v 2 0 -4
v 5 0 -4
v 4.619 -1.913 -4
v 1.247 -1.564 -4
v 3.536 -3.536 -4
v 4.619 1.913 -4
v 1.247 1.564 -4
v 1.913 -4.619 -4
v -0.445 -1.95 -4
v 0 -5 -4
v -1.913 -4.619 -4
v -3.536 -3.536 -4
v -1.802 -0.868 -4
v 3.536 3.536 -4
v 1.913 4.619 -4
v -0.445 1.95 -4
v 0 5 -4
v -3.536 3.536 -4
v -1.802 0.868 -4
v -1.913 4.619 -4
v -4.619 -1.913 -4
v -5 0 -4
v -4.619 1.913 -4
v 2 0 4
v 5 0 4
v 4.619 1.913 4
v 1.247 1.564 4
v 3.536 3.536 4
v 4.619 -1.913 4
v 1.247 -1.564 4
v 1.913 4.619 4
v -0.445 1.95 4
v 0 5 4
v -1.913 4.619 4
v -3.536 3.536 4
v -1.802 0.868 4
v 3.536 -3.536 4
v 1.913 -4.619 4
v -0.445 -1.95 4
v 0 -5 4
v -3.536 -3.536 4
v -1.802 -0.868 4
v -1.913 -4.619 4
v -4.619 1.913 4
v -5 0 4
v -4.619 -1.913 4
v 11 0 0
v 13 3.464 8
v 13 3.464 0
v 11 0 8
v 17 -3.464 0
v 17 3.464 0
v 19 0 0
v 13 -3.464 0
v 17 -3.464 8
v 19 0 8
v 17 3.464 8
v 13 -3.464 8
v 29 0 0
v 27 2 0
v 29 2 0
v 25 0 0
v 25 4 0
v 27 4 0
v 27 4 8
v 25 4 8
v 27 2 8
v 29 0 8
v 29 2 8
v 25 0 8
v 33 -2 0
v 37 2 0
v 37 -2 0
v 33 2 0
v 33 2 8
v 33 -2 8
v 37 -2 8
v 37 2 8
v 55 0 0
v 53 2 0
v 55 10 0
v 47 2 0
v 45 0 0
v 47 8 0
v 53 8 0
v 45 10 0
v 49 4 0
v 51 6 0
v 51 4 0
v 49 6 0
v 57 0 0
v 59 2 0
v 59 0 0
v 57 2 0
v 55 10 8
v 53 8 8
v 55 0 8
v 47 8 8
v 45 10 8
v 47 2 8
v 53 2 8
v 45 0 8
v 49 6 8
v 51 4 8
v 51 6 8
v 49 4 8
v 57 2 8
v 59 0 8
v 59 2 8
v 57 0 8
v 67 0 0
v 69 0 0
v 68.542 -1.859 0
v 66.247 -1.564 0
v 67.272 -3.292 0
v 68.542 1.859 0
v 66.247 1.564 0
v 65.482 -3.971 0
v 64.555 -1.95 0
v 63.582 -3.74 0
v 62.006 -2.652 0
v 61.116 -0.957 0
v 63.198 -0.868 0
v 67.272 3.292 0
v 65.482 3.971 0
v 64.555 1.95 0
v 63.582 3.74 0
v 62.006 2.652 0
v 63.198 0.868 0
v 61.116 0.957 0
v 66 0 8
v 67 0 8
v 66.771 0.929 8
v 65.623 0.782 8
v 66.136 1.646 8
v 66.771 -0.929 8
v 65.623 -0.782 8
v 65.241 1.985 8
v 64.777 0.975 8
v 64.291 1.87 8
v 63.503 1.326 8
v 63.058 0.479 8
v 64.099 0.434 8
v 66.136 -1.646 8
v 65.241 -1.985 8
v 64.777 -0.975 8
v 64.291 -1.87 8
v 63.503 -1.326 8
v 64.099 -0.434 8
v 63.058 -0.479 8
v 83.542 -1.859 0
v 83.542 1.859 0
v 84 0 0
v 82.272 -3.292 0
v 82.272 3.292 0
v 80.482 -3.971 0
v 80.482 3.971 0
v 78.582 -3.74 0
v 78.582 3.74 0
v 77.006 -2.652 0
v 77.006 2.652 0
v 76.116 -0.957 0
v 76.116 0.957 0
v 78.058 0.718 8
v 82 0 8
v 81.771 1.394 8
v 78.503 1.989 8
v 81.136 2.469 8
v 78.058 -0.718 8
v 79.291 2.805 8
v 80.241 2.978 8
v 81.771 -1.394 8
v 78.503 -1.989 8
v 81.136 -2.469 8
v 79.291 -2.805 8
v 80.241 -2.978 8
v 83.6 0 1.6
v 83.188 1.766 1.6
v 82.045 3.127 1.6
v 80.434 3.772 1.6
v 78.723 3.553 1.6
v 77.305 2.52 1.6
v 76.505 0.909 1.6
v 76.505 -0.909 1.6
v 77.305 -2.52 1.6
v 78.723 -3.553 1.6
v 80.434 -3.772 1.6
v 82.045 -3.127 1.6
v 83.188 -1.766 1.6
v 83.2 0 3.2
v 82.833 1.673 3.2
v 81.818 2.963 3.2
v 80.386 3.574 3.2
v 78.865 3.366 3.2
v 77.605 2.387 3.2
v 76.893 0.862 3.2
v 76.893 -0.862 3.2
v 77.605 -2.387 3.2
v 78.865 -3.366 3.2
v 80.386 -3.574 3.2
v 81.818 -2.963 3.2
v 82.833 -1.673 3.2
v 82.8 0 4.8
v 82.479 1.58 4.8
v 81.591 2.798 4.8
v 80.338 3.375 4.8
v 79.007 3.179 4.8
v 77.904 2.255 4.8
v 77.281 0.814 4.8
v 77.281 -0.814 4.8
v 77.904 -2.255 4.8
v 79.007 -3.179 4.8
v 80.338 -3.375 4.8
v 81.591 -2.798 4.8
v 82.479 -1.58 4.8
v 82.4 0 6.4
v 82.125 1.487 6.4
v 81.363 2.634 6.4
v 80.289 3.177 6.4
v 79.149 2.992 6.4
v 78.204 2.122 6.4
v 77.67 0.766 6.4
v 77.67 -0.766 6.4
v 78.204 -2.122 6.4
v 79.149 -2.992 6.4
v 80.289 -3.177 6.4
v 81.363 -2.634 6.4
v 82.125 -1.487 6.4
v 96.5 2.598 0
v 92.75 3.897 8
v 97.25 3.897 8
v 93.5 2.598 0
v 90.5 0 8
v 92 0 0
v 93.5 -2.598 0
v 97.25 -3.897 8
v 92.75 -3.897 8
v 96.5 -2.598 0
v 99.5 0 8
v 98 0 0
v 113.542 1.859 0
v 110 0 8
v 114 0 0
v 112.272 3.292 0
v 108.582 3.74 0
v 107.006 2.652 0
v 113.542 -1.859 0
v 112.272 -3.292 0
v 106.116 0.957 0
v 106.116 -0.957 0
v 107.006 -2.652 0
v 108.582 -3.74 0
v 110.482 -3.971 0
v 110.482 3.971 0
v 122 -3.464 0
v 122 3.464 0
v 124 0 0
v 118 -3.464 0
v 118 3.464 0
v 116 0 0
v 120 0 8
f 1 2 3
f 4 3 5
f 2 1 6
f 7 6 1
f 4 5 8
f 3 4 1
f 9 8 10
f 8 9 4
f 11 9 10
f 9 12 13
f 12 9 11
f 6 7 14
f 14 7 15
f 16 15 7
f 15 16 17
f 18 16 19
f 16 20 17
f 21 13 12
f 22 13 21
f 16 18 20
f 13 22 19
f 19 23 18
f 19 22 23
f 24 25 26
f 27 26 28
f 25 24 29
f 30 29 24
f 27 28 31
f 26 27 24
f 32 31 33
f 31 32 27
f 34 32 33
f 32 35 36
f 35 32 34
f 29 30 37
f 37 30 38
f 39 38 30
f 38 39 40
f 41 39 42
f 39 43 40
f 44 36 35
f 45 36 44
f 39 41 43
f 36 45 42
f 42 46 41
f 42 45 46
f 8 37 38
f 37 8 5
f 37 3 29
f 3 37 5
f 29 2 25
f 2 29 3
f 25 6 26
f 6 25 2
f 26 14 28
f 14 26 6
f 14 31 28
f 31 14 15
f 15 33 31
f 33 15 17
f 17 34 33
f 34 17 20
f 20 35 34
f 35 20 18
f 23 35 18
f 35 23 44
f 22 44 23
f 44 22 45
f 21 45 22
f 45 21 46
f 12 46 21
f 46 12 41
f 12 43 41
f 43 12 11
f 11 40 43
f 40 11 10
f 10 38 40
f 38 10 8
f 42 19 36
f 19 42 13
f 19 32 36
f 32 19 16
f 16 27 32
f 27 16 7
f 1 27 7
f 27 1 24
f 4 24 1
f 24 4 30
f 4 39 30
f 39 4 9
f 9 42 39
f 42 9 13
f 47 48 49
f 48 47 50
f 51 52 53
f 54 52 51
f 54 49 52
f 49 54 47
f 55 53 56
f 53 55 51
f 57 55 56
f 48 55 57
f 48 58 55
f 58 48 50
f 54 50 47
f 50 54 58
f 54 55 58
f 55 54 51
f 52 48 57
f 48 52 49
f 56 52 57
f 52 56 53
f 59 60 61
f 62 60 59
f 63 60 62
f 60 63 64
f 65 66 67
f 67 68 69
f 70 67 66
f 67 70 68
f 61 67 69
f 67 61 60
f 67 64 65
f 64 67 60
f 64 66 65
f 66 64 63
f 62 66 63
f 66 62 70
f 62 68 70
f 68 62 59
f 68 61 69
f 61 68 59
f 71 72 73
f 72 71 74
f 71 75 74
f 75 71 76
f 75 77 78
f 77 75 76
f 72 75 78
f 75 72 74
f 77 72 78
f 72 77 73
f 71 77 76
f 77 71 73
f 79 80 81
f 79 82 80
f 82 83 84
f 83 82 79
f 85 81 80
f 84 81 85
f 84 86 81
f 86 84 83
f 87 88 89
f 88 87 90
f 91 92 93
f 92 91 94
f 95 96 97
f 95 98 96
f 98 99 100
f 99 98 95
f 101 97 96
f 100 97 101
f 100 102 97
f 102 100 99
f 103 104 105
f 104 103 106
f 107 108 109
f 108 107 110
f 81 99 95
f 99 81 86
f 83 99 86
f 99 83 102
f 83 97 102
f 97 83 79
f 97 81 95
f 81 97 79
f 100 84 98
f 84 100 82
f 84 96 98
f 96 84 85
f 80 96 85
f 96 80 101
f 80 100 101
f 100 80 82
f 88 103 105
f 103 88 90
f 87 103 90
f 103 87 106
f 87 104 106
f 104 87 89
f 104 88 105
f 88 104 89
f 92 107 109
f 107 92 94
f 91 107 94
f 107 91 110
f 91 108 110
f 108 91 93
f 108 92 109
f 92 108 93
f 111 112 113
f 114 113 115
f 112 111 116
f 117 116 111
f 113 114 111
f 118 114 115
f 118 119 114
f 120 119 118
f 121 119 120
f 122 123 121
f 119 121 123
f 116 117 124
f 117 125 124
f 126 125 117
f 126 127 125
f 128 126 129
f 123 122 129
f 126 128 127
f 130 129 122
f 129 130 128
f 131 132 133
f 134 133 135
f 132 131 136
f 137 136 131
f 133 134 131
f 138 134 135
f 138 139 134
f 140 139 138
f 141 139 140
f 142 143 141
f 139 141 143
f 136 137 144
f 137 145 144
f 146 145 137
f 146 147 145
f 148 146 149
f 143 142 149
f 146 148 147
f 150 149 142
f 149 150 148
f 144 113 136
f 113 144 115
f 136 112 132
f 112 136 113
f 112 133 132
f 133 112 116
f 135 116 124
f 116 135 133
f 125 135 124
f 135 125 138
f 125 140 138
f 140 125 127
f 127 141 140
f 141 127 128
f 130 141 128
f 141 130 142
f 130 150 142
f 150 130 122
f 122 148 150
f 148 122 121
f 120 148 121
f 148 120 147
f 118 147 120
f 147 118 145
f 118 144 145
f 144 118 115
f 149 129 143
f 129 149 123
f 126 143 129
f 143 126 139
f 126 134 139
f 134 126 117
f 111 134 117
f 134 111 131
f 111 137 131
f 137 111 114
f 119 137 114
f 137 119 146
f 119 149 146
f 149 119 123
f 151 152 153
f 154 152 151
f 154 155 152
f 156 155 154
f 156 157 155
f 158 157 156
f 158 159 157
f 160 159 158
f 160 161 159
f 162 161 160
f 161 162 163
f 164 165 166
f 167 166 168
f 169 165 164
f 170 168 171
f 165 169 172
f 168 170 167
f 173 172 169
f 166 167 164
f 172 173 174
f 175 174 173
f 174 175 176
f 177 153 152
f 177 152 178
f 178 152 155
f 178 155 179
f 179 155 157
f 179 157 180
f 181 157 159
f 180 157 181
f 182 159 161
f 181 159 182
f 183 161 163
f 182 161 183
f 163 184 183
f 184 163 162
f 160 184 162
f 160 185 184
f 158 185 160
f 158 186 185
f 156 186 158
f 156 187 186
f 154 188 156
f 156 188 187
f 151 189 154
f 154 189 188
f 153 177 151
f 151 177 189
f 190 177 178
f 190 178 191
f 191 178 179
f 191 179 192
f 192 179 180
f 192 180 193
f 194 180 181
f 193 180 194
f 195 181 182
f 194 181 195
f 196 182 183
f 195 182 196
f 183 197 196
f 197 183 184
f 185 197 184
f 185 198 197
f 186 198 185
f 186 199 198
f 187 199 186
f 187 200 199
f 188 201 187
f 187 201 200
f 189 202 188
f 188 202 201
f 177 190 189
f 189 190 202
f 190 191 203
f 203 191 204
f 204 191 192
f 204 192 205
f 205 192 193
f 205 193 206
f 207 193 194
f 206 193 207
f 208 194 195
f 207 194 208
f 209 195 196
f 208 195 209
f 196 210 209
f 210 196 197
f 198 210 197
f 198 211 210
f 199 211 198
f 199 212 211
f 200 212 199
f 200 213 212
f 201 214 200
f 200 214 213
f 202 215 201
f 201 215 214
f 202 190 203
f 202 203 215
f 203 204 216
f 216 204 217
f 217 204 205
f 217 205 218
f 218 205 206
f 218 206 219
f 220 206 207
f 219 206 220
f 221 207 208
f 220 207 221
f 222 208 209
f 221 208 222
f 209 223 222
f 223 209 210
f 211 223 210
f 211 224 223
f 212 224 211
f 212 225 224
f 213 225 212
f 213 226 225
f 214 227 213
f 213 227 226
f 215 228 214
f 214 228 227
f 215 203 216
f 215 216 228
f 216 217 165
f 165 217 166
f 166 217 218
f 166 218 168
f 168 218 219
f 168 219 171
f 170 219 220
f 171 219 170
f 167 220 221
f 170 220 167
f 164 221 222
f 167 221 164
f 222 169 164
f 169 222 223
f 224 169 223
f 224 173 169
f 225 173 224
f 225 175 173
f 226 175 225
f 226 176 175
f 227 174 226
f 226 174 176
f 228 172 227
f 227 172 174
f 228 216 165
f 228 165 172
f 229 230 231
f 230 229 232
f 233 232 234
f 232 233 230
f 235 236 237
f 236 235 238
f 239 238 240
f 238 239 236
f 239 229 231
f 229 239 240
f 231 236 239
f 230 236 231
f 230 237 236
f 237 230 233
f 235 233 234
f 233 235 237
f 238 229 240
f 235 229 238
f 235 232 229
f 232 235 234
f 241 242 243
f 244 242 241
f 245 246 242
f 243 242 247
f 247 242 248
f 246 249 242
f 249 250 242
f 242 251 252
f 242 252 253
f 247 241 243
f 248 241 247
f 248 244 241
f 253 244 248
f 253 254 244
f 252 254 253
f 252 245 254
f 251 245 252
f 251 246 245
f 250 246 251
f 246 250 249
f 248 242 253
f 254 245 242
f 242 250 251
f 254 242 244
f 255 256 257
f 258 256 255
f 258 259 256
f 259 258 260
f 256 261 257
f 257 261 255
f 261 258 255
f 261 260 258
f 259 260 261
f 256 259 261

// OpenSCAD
linear_extrude(height=8, center=true)
  difference() {
    circle(r=5);
    circle(r=2);
  }

translate([15, 0, 0]) linear_extrude(height=8) circle(r=4, $fn=6);
translate([25, 0, 0]) linear_extrude(height=8)
  polygon([[0,0], [4,0], [4,2], [2,2], [2,4], [0,4]]);
translate([35, 0, 0]) linear_extrude(height=8) square([4,4], center=true);

// Nested island, hole, and a disconnected contour in deliberately mixed order.
translate([45, 0, 0]) linear_extrude(height=8)
  polygon(points=[[0,0], [10,0], [10,10], [0,10],
                  [2,2], [8,2], [8,8], [2,8],
                  [4,4], [6,4], [6,6], [4,6],
                  [12,0], [14,0], [14,2], [12,2]],
          paths=[[8,9,10,11], [4,5,6,7], [12,13,14,15], [0,1,2,3]]);

translate([65, 0, 0]) linear_extrude(height=8, scale=0.5)
  difference() { circle(r=4); circle(r=2); }
translate([80, 0, 0]) linear_extrude(height=8, scale=[0.5, 0.75]) circle(r=4);
translate([95, 0, 0]) linear_extrude(height=8, scale=1.5) circle(r=3, $fn=6);
translate([110, 0, 0]) linear_extrude(height=8, scale=0) circle(r=4);
translate([120, 0, 0]) linear_extrude(height=8, scale=0) circle(r=4, $fn=6);
translate([130, 0, 0]) linear_extrude(height=8, scale=0)
  difference() { circle(r=4); circle(r=2); }
